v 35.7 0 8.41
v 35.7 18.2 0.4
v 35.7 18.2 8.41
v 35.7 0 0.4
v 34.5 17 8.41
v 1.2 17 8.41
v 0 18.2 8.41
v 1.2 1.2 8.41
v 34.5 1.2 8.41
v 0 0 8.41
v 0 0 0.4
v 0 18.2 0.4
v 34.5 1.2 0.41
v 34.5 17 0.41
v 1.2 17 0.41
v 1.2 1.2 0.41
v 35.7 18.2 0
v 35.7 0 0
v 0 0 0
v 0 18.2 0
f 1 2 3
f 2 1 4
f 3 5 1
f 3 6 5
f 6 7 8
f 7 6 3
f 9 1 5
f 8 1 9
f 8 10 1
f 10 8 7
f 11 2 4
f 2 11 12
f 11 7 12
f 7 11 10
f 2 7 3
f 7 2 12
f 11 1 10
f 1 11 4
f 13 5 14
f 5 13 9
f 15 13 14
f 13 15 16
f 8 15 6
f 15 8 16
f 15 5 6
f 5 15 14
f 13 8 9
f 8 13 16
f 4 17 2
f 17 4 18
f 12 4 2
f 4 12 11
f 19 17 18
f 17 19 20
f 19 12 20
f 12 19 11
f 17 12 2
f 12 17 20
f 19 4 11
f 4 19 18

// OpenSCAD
// file: ../../Base/Rotation.scad
// Fischertechnik Box Foundation
// Geometry Helpers Rotation

include <PlacementOptions.scad>

// getRotatedSpace(space, rotation=NoRotation)
// Rotates the space dependent on the specified rotation

function getRotatedSpace(space, rotation=NoRotation) = [
    (rotation == Rotate90 || rotation == Rotate270) ? space.y : space.x,
    (rotation == Rotate90 || rotation == Rotate270) ? space.x : space.y
];

// Rotates the given space around the fixed left lower corner
// space = the space the children needs as width/depth list [width,depth]
// rotation = 0 Rotate0 degrees, 1 Rotate90 degrees, 2 Rotate180 degrees, 3 Rotate270 degrees (equivalent to -90)

module RotateFix(space, rotation=NoRotation) {
    dy = (rotation == Rotate0 || rotation == Rotate270) ? 0 :
        (rotation == Rotate90) ? space.x :
        space.y;
    dx = (rotation < Rotate180) ? 0 :
        (rotation == Rotate180) ? space.x :
        space.y;
    
    translate([dx, dy, 0])
        rotate([0, 0, rotations[rotation]])
            children();
}
// file: ../../Base/Alignment.scad
// Fischertechnik Box Foundation
// Geometry Helpers Alignment

include <PlacementOptions.scad>

// getAlignedX(elementWidth, spaceWidth, align=AlignRight, offset=0)
// Gets the aligned X offset of an element with the given
// width in the given space.
// elementWidth = The width of the element to positon
// spaceWidth = The space where the element should be aligned
// align = 0 AlignLeft, 1 AlignCenter, 2 AlignRight
// offset = an optional offset from the aligned position. When
// aligned left or centered, then positive values are in X direction.
// When aligned right then positive values are in negative X direction.

function getAlignedX(elementWidth, spaceWidth, align=AlignRight, offset=0) =
    (align == AlignLeft) ?
        offset :
        ((align == AlignCenter) ?
        (spaceWidth - elementWidth)/2 + offset :
        spaceWidth - offset - elementWidth);

// getAlignedY(elementDepth, spaceDepth, align=AlignTop, offset=0)
// Gets the aligned Y offset of an element with the given
// depth in the given space.
// elementDepth = The depth of the element to positon
// spaceDepth = The space where the element should be aligned
// align = 0 AlignBottom, 1 AlignCenter, 2 AlignTop
// offset = an optional offset from the aligned position. When
// aligned bottom or centered, then positive values are in Y direction.
// When aligned top then positive values are in negative Y direction.

function getAlignedY(elementDepth, spaceDepth, align=AlignTop, offset=0) =
    (align == AlignBottom) ?
        offset :
        ((align == AlignCenter) ?
        (spaceDepth - elementDepth)/2 + offset :
        spaceDepth - offset - elementDepth);
// file: ../../Base/PlacementOptions.scad
// Fischertechnik Box Foundation
// Placement Options

// Alignment
NoAlign = 0;
AlignLeft = 1;
AlignBottom = 2;
AlignCenter = 3;
AlignRight = 4;
AlignTop = 5;

// Element rotation degree steps
rotations = [0, -90, -180, -270];

// Rotation
NoRotation = 0;
Rotate0 = 0;
Rotate90 = 1;
Rotate180 = 2;
Rotate270 = 3;

// Docking (seen from above)
NoDock = -1;
DockLeft = 0;
DockTop = 1;
DockRight = 2;
DockCorner = 2;
DockBottom = 3;

// Web corners
LowerLeft = 0;
UpperLeft = 1;
UpperRight = 2;
LowerRight = 3;

// Web position relative to corner
LeftOfCorner = 0;
RightOfCorner = 1;
// file: ../../Base/Boxes.scad
// Fischertechnik Box Foundation
// Pre-designed Boxes

use <Constants.scad>

include <PlacementOptions.scad>

box190Width = 190;
box190Depth = 130;
box130Width = 130;
box130Depth = 95;

// Values are from an original ec3 box
topBottomDifference = 1.5;
outerHeight = 40;
innerHeight = 38.2;
baseThickness = outerHeight - innerHeight;
stackExcess = 5.7;
radius = 3.5;
wallThickness = 1.5;
tolerance = 0.2;
stackOffset = innerHeight - stackExcess;

boxUsageHeight = stackOffset;
boxWallThickness = wallThickness;
boxBaseThickness = baseThickness;
boxWebWidth = 3.0;

// getBoxWallThickness()
// Gets the wall thickness of a Fischertechnik Box
function getBoxWallThickness() = boxWallThickness;

// getBoxUsageHeight()
// Gets the usable height of a Fischertechnik box
function getBoxUsageHeight() = boxUsageHeight;

// getBoxInnerHeight()
// Gets the inner height of a Fischertechnik box, including the stack excess
function getBoxInnerHeight() = innerHeight;

// getBoxBaseThickness()
// Gets the thickness of the Fischertechnik box base.
function getBoxBaseThickness() = boxBaseThickness;

// getBoxWebWidth()
// Gets the width of a box web
function getBoxWebWidth() = boxWebWidth;

// getBox190Space()
// Gets the usable inner space of a Box 190 as an x/y-list
function getBox190Space() = [
    box190Width - 2*getBoxWallThickness() - topBottomDifference, 
    box190Depth - 2*getBoxWallThickness() - topBottomDifference ];

// BoxBase(width, depth)
// Creates an empty stackable Fischertechnik compatible box
// width = Outer width of the box (190, 130, ...)
// depth = Outer depth of the box (130, 95, ...)

module BoxBase(width, depth, height=outerHeight) {    
    thinPlate = 0.01;

    innerHeight = height - baseThickness;    
    
    module BodyPlate(width, depth) {
        translate([radius, radius])
        hull() {
            w = width-2*radius;
            d = depth-2*radius;
            cube([w, d, thinPlate]);
            cylinder(thinPlate, r=radius, $fn=getFragments());
            translate([w, 0])
                cylinder(thinPlate, r=radius, $fn=getFragments());
            translate([w, d])
                cylinder(thinPlate, r=radius, $fn=getFragments());
            translate([0, d])
                cylinder(thinPlate, r=radius, $fn=getFragments());
        }
    }
    
    module Body(tolerance=tolerance) {
        hull() {
            // Bottom with tolerance to fit into the original boxes when stacked
            translate([-wallThickness+tolerance, -wallThickness+tolerance, -baseThickness])
                BodyPlate(width-topBottomDifference-2*tolerance, depth-topBottomDifference-2*tolerance);
            
            // Top
            translate([-wallThickness-topBottomDifference/2, -wallThickness-topBottomDifference/2, innerHeight-thinPlate])
                BodyPlate(width, depth);
         }
    }

    module Cutoff() {
        hull() {
            coWidth = width - 2*wallThickness;
            coDepth = depth - 2*wallThickness;
            
            // Bottom
            BodyPlate(coWidth-topBottomDifference, coDepth-topBottomDifference);

            // Top
            translate([-topBottomDifference/2, -topBottomDifference/2, innerHeight+thinPlate]) 
                BodyPlate(coWidth, coDepth);
        }
    }
    
    difference() {        
        Body();
        Cutoff();
        stackOffset = innerHeight - stackExcess;
        translate([0, 0, stackOffset + baseThickness])
            Body(tolerance=0);
    }
}

// Creates the Fischertechnik empty box 130x190 mm and places it at position 0,0
// 190x130 are the outer sizes, the inner space is slightly smaller. Use getBox190Space() to get the inner sizes.
// The box is positioned that the usable inner space is at the 0,0,0 position. The

module Box190() {
    BoxBase(box190Width, box190Depth);
}

// Gets the usable inner space of a Box 130 as an x/y-list
function getBox130Space() = [
    box130Width - 2*getBoxWallThickness() - topBottomDifference, 
    box130Depth - 2*getBoxWallThickness() - topBottomDifference ];

// Creates the Fischertechnik empty box 95x130 mm and places it at position 0,0
// 190x130 are the outer sizes, the inner space is slightly smaller. Use getBox190Space() to get the inner sizes.
// The box is positioned that the usable inner space is at the 0,0,0 position. The

module Box130() {
    BoxBase(box130Width, box130Depth);
}

// Creates a web at the specified box walls
// corner 0 = LowerLeft, 1 = UpperLeft, 2 = UpperRight, 3 = LowerRight
// side 0 = LeftOfCorner, 1 = RightOfCorner
// distance = Distance in mm from the corner
// boxSpace = inner width and depth of the box (default: Box 190)
// webWidth = length of the web (default is 3 mms)
// webThickness = thickness of the web (default is 1 mm)

module BoxWeb(corner, side, distance, boxSpace=getBox190Space(), webWidth=getBoxWebWidth(), webThickness=1.0) {
    sink = getBoxWallThickness()/2;

    width = (corner % 2 == 0) ? 
            (side == LeftOfCorner ? webWidth : webThickness) :
            (side == LeftOfCorner ? webThickness : webWidth);

    depth = (corner % 2 == 0) ? 
            (side == RightOfCorner ? webWidth : webThickness) :
            (side == RightOfCorner ? webThickness : webWidth);
    
    xDiff = corner == LowerLeft ? 
                (side == LeftOfCorner ? -sink : distance) :
            (corner == UpperLeft ?                
                (side == LeftOfCorner ? distance : -sink) :
            (corner == UpperRight ?
                (side == LeftOfCorner ? boxSpace.x-webWidth+sink : boxSpace.x-distance-webThickness) :
                (side == LeftOfCorner ? boxSpace.x-distance-webThickness: boxSpace.x-webWidth+sink)));

    yDiff = corner == LowerLeft ? 
                (side == RightOfCorner ? -sink : distance) :
            (corner == UpperLeft ?
                (side == RightOfCorner ? boxSpace.y-distance : boxSpace.y-webWidth+sink) :
            (corner == UpperRight ?
                (side == RightOfCorner ? boxSpace.y-webWidth+sink : boxSpace.y-distance) :
                (side == RightOfCorner ? distance : -sink)));
    
    translate([xDiff, yDiff, -getExcess()])
        cube([width, depth, boxUsageHeight + 2*getExcess()]);
}
// file: ../../Base/Placement.scad
// Fischertechnik Box Foundation
// Geometry Helpers Placement

use <Constants.scad>
use <Alignment.scad>
use <Rotation.scad>
use <Boxes.scad>

include <PlacementOptions.scad>

// Place(x=0, y=0, elementSpace=[0,0], alignX=AlignLeft, alignY=AlignBottom, rotation=Rotate0, boxSpace=getBox190Space())
// Places the child at the specified position
// y = Y-Position. This is a relative position when an X aligment is specified.
// x = X-Position. This is a relative position when an Y aligment is specified.
// elementSpace = space of the element to be placed [x,y]
// alignX = -1=NoAlign, 0 AlignLeft, 1 AlignCenter, 3 AlignRight (elementSpace and boxSpace required!)
// alignY = -1=NoAlign, 2 AlignBottom, 1 AlignCenter, 4 AlignTop (elementSpace and boxSpace required!)
// rotation = 0 Rotate0 0 degrees, 1 Rotate90 90 degrees, 
// 2 Rotate180 180 degrees, 3 Rotate270 270 degrees (equivalent to -90)
// boxSpace = Inner space of the box where the placement occurs [x,y] - default is Box 190x130 inner space

module Place(x=0, y=0, elementSpace=[0,0], 
  alignX=AlignLeft, alignY=AlignBottom, 
  rotation=NoRotation, boxSpace=getBox190Space()) {

    module Position(x, y, space, rotation=Rotate0) {
        translate([x, y, 0])
            RotateFix(space, rotation)
                children();
    }

    space = getRotatedSpace(elementSpace, rotation);
    alignedX = getAlignedX(space.x, boxSpace.x, alignX, x);
    alignedY = getAlignedY(space.y, boxSpace.y, alignY, y);
    Position(alignedX, alignedY, elementSpace, rotation)
        children();
}

// Center(space=getBox130Space(), elementSpace=[0,0])
// space = Space where the children is centered. For cylinder use centered=true and no elementSpace.
// elementSpace = space of the element to be centered [x,y]

module Center(space=getBox190Space(), elementSpace=[0,0]) {
    Place(elementSpace=elementSpace, boxSpace=space, alignX=AlignCenter, alignY=AlignCenter)
        children();
}

// CenterHorizontal(width=0, y=0, offset=0, space=getBox130Space())
// width = Width of the element to be placed.
// y = Y position of the element
// offset = Offset from the center position (negative will be left of the center)
// space = Space where the element is placed

module CenterHorizontal(width=0, y=0, offset=0, space=getBox190Space()) {
    Place(x=offset, y=y, elementSpace=[width, 0], boxSpace=space, alignX=AlignCenter)
        children(0);
}

// CenterVertical(depth=0, x=0, offset=0, space=getBox130Space())
// depth = Depth of the element to be placed.
// x = X position of the element
// offset = Offset from the center position (negative will be down of the center)
// space = Space where the element is placed

module CenterVertical(depth=0, x=0, offset=0, space=getBox190Space()) {
    Place(x=x, y=offset, elementSpace=[0, depth], boxSpace=space, alignY=AlignCenter)
        children(0);
}

// getIsVertical(align)
// True if the specified alignment needs a vertical orientation for a divider (AlignRight, AlignLeft)

function getIsVertical(align) = (align == AlignRight || align == AlignLeft);

// getIsHorizontal(align)
// True if the specified alignment needs a horizontal orientation for a divider (AlignTop, AlignBottom)

function getIsHorizontal(align) = (align == AlignTop || align == AlignBottom);
// file: ../../Elements/AxisClip10.scad
// Fischertechnik Box Library
// Axis for clip 10
// 31023

use <../ModelBase/Simple.scad>
use <../Base/Constants.scad>

width = 12;
depth = 12;
height = 23;
upperDiameter = 3.6;
clipHeight = 10;

// getAxisClip10Space()
// Gets the space of a frame for a clip 10 with spring ring (mot2)

function getAxisClip10Space() = [width, depth, height];

// AxisClip10(height, clipHeight)
// Axis for clip 10 with spring ring (mot2)
// height = Height of the complete axis
// clipHeight = Height of the rt for the clip (standard is 10, in mot3 its only 7)

module AxisClip10(height=height, clipHeight=clipHeight) {
    LeveledAxisWithSpace(height, height-clipHeight, getAxisClip10Space(), diameter=upperDiameter);
}

// Tests
color("lightgray")
AxisClip10();
// file: ../../Base/Constants.scad
// Fischertechnik Box Foundation
// Constants

// Constant values necessary for multiple elements

// Base constants
dividerThickness = 1.2;
excess = 0.01;
fragments = 90;
tolerance = 0.8;

// Gets the thickness of a divider 
function getDividerThickness() = dividerThickness;

// Gets the excess that is used to merge walls into each other
function getExcess() = excess;

// Gets amount of fragments of a cylinder
function getFragments() = fragments;

// Gets the inner tolerance of a frame to each side
function getTolerance() = tolerance;


// Fischertechnik specific constants
axisDiameter = 4;
axisBottomDiameter = axisDiameter + 1;
standardEdgeDistance = 2.5;
standardWebDistance = 11.5;
standardCornerLength = 15;
tubeWallFactor = 0.8;
smallPartsFrameHeight = 20;

// Gets axis diameter
function getAxisDiameter() = axisDiameter;

// Gets axis bottom diameter for thicker part at the bottom
function getAxisBottomDiameter() = axisBottomDiameter;

// gets the standard distance to the wall of the box for dockable frames with webs
function getStandardEdgeDistance() = standardEdgeDistance;

// gets the standard distance of each web to the corner of the dockable frame
function getStandardWebDistance() = standardWebDistance;

// gets the standard length of the corner walls of a dockable frame
function getStandardCornerLength() = standardCornerLength;

// gets the wall thickness of a tube.
function getTubeWallThickness() = tubeWallFactor * getDividerThickness();

// gets the frame height for docked small parts boxes.
function getSmallPartsFrameHeight() = smallPartsFrameHeight;
// file: ../../Elements/FrameSingleLayingStandardBlock.scad
// Fischertechnik Box Library
// Frame for one laying standard block
// 31004, 32880

use <../ModelBase/Simple.scad>

width = 32.5;
depth = 15;
height = 8;

// getFrameSingleLayingBlockSpace()
// Gets the space of a frame for a single laying 30 mm bulding block

function getFrameSingleLayingStandardBlockSpace(columns=1, rows=1) = getFrameOuterVolume([width, depth, height]);

// FrameSingleLayingBlock()
// Frame for a single laying 30 mm bulding block

module FrameSingleLayingStandardBlock() {
    Frame([width, depth, height]);
}

// Tests
color("lightgray")
FrameSingleLayingStandardBlock();
// file: ../TestPrint.scad
// 3D Print Test Base

use <../Base/Constants.scad>

use <../Elements/AxisClip10.scad>

module TestPrint(elementSpace) {
    cube([elementSpace.x, elementSpace.y, 0.4]);
    translate([0,0,0.4+getExcess()]) {
        children();
    }
}

TestPrint(getAxisClip10Space())
    AxisClip10();
// main file
// 3D Print Test
// FrameSingleLayingStandardBlock

use <../TestPrint.scad>
use <../../Elements/FrameSingleLayingStandardBlock.scad>

TestPrint(getFrameSingleLayingStandardBlockSpace())
    FrameSingleLayingStandardBlock();
